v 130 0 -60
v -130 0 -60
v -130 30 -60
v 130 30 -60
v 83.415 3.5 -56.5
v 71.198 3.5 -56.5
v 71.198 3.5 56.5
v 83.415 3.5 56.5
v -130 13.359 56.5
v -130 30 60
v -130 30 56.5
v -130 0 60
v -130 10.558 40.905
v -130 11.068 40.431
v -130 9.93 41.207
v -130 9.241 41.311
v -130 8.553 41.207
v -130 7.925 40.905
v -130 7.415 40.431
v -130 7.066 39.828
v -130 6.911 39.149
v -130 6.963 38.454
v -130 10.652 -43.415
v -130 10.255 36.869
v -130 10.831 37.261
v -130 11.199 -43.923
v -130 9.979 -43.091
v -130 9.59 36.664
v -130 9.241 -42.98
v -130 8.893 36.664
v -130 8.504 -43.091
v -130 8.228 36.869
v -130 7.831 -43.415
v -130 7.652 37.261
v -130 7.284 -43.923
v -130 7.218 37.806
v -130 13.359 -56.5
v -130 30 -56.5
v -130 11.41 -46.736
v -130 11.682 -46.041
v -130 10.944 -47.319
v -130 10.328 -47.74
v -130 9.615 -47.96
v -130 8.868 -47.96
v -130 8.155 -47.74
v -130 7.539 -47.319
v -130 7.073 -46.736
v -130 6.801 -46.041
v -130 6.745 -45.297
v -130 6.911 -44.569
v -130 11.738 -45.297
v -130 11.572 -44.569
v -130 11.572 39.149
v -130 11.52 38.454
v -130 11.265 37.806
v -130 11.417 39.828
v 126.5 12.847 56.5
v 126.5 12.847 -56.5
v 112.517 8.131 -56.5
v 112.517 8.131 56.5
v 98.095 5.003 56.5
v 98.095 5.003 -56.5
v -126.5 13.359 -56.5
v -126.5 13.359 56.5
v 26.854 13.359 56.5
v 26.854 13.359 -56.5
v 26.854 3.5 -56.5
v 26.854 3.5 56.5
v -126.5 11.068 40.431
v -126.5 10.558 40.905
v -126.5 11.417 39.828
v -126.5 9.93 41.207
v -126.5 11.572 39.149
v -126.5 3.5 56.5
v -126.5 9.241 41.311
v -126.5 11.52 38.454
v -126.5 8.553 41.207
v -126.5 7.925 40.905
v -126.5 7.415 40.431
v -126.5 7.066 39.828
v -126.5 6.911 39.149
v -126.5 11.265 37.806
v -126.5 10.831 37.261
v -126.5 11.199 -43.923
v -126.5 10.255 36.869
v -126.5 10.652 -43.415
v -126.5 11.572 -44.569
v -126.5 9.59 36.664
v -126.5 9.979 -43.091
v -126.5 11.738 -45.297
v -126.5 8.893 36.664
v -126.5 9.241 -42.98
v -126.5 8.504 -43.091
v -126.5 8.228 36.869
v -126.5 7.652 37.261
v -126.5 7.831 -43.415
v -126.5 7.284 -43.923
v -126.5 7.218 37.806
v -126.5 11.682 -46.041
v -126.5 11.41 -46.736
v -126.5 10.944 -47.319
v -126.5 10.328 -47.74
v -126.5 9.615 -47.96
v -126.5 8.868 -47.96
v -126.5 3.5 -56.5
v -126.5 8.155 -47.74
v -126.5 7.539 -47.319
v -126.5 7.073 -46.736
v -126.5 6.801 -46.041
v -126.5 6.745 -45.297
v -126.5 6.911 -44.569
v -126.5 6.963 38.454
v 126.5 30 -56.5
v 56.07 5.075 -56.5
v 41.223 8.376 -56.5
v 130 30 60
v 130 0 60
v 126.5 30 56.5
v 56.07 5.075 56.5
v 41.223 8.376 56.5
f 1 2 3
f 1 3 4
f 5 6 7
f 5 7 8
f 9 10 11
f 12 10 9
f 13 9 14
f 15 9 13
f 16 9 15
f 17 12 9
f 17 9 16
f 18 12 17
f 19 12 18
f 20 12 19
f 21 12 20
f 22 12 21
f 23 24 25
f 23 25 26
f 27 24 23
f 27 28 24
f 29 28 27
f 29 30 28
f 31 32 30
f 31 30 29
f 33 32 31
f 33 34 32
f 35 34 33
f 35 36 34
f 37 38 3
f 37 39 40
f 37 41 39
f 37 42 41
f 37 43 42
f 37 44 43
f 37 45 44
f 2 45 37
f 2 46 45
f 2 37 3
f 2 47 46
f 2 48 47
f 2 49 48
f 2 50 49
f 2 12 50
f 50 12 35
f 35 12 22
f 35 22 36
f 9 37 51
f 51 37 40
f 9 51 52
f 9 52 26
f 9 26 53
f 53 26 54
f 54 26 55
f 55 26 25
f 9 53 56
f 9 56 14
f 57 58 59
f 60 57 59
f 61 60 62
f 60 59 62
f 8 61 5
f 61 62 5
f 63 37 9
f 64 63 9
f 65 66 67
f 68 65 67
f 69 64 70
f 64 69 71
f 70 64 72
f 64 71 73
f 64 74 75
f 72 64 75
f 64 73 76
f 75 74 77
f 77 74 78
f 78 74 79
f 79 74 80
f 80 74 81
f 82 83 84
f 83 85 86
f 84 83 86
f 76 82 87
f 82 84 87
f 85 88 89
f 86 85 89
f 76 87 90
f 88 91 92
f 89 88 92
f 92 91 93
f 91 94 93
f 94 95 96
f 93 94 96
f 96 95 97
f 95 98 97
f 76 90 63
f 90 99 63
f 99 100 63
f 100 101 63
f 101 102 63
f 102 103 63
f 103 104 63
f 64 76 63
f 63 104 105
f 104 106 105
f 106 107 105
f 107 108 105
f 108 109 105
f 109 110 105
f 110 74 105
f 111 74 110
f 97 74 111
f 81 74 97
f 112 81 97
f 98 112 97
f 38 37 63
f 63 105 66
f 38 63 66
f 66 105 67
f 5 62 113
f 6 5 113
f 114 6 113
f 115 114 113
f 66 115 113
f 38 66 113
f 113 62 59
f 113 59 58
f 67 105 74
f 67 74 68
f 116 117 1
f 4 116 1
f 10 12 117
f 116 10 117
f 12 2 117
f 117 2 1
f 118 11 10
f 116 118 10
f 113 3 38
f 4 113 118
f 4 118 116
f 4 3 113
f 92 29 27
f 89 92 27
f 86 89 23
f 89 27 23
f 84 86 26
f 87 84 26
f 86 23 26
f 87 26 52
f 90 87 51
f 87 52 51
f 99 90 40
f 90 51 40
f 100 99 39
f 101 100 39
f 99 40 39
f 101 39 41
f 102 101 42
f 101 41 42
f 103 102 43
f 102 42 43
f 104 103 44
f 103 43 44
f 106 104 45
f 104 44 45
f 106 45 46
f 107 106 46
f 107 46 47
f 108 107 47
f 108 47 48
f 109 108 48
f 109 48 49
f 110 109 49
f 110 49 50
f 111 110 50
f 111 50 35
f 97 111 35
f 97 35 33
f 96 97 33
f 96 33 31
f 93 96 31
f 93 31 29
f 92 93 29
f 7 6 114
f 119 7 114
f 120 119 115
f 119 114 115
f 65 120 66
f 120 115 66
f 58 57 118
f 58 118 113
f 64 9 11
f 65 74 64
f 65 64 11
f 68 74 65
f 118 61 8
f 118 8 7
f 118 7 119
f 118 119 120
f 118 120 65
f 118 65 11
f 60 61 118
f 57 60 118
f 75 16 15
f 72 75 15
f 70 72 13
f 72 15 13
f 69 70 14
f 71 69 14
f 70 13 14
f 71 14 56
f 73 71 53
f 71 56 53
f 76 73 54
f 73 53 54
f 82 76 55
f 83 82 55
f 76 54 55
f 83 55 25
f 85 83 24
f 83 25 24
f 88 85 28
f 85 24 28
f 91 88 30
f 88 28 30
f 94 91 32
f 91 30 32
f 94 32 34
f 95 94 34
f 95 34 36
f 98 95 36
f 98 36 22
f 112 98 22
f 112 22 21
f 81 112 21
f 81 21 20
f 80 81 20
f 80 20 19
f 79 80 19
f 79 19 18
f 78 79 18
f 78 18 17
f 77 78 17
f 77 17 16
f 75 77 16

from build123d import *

# Parameters (mm, degrees)
CROQUIS1_W              = 260
CROQUIS1_H              = 120
SALIENTE_EXTRUIR1_DEPTH = 30
VACIADO1_T              = -3.5
SALIENTE_EXTRUIR2_REACH = 179.122
CROQUIS3_W              = 113
CROQUIS3_H              = 24.257897879
CORTAR_EXTRUIR1_DEPTH   = 50.8
CROQUIS4_R              = 2.503701387
CROQUIS4_R_2            = 2.336787961
CORTAR_EXTRUIR2_DEPTH   = 50.8


with BuildPart() as part:
    # Croquis1 → Saliente-Extruir1 (new body)
    with BuildSketch(Plane(origin=(0, 0, 0), x_dir=(1, 0, 0), z_dir=(0, 1, 0))):
        Rectangle(CROQUIS1_W, CROQUIS1_H)
    extrude(amount=SALIENTE_EXTRUIR1_DEPTH)

    # Vaciado1
    vaciado1_openings = [part.faces().sort_by_distance(p)[0] for p in [
        (0, 30, 0),
    ]]
    offset(amount=VACIADO1_T, openings=vaciado1_openings, kind=Kind.INTERSECTION)

    # Croquis2 → Saliente-Extruir2 (add, up to next)
    with BuildSketch(Plane.XY.offset(-56.5), mode=Mode.PRIVATE) as saliente_extruir2_sk1:
        with BuildLine():
            Line((26.853568464, 3.358871314), (77.306419391, 3.358871314))
            ThreePointArc((77.306419391, 3.358871314), (51.589255051, 5.882953779), (26.853568464, 13.358871314))
            Line((26.853568464, 13.358871314), (26.853568464, 3.358871314))
        make_face()
    saliente_extruir2_tool1 = extrude(saliente_extruir2_sk1.sketch, amount=SALIENTE_EXTRUIR2_REACH, mode=Mode.PRIVATE) - part.part
    # Croquis2 → Saliente-Extruir2 (add, up to next)
    with BuildSketch(Plane.XY.offset(-56.5), mode=Mode.PRIVATE) as saliente_extruir2_sk2:
        with BuildLine():
            ThreePointArc((126.5, 12.846828341), (105.349686421, 6.365747469), (83.415063898, 3.5))
            Line((83.415063898, 3.5), (126.5, 3.5))
            Line((126.5, 3.5), (126.5, 12.846828341))
        make_face()
    saliente_extruir2_tool2 = extrude(saliente_extruir2_sk2.sketch, amount=SALIENTE_EXTRUIR2_REACH, mode=Mode.PRIVATE) - part.part
    add(saliente_extruir2_tool1.solids().sort_by_distance((39.369452, 6.338377, -56.5))[0])
    add(saliente_extruir2_tool2.solids().sort_by_distance((114.741247, 6.306435, -56.5))[0])

    # Croquis3 → Cortar-Extruir1 (cut)
    with BuildSketch(Plane.ZY.offset(130)):
        with Locations((0, 25.487820254)):
            Rectangle(CROQUIS3_W, CROQUIS3_H)
    extrude(amount=-CORTAR_EXTRUIR1_DEPTH, mode=Mode.SUBTRACT)

    # Croquis4 → Cortar-Extruir2 (cut)
    with BuildSketch(Plane.ZY.offset(130)):
        with Locations((-45.483908525, 9.241486811)):
            Circle(CROQUIS4_R)
        with Locations((38.97428492, 9.241486811)):
            Circle(CROQUIS4_R_2)
    extrude(amount=-CORTAR_EXTRUIR2_DEPTH, mode=Mode.SUBTRACT)


solid = part.part
